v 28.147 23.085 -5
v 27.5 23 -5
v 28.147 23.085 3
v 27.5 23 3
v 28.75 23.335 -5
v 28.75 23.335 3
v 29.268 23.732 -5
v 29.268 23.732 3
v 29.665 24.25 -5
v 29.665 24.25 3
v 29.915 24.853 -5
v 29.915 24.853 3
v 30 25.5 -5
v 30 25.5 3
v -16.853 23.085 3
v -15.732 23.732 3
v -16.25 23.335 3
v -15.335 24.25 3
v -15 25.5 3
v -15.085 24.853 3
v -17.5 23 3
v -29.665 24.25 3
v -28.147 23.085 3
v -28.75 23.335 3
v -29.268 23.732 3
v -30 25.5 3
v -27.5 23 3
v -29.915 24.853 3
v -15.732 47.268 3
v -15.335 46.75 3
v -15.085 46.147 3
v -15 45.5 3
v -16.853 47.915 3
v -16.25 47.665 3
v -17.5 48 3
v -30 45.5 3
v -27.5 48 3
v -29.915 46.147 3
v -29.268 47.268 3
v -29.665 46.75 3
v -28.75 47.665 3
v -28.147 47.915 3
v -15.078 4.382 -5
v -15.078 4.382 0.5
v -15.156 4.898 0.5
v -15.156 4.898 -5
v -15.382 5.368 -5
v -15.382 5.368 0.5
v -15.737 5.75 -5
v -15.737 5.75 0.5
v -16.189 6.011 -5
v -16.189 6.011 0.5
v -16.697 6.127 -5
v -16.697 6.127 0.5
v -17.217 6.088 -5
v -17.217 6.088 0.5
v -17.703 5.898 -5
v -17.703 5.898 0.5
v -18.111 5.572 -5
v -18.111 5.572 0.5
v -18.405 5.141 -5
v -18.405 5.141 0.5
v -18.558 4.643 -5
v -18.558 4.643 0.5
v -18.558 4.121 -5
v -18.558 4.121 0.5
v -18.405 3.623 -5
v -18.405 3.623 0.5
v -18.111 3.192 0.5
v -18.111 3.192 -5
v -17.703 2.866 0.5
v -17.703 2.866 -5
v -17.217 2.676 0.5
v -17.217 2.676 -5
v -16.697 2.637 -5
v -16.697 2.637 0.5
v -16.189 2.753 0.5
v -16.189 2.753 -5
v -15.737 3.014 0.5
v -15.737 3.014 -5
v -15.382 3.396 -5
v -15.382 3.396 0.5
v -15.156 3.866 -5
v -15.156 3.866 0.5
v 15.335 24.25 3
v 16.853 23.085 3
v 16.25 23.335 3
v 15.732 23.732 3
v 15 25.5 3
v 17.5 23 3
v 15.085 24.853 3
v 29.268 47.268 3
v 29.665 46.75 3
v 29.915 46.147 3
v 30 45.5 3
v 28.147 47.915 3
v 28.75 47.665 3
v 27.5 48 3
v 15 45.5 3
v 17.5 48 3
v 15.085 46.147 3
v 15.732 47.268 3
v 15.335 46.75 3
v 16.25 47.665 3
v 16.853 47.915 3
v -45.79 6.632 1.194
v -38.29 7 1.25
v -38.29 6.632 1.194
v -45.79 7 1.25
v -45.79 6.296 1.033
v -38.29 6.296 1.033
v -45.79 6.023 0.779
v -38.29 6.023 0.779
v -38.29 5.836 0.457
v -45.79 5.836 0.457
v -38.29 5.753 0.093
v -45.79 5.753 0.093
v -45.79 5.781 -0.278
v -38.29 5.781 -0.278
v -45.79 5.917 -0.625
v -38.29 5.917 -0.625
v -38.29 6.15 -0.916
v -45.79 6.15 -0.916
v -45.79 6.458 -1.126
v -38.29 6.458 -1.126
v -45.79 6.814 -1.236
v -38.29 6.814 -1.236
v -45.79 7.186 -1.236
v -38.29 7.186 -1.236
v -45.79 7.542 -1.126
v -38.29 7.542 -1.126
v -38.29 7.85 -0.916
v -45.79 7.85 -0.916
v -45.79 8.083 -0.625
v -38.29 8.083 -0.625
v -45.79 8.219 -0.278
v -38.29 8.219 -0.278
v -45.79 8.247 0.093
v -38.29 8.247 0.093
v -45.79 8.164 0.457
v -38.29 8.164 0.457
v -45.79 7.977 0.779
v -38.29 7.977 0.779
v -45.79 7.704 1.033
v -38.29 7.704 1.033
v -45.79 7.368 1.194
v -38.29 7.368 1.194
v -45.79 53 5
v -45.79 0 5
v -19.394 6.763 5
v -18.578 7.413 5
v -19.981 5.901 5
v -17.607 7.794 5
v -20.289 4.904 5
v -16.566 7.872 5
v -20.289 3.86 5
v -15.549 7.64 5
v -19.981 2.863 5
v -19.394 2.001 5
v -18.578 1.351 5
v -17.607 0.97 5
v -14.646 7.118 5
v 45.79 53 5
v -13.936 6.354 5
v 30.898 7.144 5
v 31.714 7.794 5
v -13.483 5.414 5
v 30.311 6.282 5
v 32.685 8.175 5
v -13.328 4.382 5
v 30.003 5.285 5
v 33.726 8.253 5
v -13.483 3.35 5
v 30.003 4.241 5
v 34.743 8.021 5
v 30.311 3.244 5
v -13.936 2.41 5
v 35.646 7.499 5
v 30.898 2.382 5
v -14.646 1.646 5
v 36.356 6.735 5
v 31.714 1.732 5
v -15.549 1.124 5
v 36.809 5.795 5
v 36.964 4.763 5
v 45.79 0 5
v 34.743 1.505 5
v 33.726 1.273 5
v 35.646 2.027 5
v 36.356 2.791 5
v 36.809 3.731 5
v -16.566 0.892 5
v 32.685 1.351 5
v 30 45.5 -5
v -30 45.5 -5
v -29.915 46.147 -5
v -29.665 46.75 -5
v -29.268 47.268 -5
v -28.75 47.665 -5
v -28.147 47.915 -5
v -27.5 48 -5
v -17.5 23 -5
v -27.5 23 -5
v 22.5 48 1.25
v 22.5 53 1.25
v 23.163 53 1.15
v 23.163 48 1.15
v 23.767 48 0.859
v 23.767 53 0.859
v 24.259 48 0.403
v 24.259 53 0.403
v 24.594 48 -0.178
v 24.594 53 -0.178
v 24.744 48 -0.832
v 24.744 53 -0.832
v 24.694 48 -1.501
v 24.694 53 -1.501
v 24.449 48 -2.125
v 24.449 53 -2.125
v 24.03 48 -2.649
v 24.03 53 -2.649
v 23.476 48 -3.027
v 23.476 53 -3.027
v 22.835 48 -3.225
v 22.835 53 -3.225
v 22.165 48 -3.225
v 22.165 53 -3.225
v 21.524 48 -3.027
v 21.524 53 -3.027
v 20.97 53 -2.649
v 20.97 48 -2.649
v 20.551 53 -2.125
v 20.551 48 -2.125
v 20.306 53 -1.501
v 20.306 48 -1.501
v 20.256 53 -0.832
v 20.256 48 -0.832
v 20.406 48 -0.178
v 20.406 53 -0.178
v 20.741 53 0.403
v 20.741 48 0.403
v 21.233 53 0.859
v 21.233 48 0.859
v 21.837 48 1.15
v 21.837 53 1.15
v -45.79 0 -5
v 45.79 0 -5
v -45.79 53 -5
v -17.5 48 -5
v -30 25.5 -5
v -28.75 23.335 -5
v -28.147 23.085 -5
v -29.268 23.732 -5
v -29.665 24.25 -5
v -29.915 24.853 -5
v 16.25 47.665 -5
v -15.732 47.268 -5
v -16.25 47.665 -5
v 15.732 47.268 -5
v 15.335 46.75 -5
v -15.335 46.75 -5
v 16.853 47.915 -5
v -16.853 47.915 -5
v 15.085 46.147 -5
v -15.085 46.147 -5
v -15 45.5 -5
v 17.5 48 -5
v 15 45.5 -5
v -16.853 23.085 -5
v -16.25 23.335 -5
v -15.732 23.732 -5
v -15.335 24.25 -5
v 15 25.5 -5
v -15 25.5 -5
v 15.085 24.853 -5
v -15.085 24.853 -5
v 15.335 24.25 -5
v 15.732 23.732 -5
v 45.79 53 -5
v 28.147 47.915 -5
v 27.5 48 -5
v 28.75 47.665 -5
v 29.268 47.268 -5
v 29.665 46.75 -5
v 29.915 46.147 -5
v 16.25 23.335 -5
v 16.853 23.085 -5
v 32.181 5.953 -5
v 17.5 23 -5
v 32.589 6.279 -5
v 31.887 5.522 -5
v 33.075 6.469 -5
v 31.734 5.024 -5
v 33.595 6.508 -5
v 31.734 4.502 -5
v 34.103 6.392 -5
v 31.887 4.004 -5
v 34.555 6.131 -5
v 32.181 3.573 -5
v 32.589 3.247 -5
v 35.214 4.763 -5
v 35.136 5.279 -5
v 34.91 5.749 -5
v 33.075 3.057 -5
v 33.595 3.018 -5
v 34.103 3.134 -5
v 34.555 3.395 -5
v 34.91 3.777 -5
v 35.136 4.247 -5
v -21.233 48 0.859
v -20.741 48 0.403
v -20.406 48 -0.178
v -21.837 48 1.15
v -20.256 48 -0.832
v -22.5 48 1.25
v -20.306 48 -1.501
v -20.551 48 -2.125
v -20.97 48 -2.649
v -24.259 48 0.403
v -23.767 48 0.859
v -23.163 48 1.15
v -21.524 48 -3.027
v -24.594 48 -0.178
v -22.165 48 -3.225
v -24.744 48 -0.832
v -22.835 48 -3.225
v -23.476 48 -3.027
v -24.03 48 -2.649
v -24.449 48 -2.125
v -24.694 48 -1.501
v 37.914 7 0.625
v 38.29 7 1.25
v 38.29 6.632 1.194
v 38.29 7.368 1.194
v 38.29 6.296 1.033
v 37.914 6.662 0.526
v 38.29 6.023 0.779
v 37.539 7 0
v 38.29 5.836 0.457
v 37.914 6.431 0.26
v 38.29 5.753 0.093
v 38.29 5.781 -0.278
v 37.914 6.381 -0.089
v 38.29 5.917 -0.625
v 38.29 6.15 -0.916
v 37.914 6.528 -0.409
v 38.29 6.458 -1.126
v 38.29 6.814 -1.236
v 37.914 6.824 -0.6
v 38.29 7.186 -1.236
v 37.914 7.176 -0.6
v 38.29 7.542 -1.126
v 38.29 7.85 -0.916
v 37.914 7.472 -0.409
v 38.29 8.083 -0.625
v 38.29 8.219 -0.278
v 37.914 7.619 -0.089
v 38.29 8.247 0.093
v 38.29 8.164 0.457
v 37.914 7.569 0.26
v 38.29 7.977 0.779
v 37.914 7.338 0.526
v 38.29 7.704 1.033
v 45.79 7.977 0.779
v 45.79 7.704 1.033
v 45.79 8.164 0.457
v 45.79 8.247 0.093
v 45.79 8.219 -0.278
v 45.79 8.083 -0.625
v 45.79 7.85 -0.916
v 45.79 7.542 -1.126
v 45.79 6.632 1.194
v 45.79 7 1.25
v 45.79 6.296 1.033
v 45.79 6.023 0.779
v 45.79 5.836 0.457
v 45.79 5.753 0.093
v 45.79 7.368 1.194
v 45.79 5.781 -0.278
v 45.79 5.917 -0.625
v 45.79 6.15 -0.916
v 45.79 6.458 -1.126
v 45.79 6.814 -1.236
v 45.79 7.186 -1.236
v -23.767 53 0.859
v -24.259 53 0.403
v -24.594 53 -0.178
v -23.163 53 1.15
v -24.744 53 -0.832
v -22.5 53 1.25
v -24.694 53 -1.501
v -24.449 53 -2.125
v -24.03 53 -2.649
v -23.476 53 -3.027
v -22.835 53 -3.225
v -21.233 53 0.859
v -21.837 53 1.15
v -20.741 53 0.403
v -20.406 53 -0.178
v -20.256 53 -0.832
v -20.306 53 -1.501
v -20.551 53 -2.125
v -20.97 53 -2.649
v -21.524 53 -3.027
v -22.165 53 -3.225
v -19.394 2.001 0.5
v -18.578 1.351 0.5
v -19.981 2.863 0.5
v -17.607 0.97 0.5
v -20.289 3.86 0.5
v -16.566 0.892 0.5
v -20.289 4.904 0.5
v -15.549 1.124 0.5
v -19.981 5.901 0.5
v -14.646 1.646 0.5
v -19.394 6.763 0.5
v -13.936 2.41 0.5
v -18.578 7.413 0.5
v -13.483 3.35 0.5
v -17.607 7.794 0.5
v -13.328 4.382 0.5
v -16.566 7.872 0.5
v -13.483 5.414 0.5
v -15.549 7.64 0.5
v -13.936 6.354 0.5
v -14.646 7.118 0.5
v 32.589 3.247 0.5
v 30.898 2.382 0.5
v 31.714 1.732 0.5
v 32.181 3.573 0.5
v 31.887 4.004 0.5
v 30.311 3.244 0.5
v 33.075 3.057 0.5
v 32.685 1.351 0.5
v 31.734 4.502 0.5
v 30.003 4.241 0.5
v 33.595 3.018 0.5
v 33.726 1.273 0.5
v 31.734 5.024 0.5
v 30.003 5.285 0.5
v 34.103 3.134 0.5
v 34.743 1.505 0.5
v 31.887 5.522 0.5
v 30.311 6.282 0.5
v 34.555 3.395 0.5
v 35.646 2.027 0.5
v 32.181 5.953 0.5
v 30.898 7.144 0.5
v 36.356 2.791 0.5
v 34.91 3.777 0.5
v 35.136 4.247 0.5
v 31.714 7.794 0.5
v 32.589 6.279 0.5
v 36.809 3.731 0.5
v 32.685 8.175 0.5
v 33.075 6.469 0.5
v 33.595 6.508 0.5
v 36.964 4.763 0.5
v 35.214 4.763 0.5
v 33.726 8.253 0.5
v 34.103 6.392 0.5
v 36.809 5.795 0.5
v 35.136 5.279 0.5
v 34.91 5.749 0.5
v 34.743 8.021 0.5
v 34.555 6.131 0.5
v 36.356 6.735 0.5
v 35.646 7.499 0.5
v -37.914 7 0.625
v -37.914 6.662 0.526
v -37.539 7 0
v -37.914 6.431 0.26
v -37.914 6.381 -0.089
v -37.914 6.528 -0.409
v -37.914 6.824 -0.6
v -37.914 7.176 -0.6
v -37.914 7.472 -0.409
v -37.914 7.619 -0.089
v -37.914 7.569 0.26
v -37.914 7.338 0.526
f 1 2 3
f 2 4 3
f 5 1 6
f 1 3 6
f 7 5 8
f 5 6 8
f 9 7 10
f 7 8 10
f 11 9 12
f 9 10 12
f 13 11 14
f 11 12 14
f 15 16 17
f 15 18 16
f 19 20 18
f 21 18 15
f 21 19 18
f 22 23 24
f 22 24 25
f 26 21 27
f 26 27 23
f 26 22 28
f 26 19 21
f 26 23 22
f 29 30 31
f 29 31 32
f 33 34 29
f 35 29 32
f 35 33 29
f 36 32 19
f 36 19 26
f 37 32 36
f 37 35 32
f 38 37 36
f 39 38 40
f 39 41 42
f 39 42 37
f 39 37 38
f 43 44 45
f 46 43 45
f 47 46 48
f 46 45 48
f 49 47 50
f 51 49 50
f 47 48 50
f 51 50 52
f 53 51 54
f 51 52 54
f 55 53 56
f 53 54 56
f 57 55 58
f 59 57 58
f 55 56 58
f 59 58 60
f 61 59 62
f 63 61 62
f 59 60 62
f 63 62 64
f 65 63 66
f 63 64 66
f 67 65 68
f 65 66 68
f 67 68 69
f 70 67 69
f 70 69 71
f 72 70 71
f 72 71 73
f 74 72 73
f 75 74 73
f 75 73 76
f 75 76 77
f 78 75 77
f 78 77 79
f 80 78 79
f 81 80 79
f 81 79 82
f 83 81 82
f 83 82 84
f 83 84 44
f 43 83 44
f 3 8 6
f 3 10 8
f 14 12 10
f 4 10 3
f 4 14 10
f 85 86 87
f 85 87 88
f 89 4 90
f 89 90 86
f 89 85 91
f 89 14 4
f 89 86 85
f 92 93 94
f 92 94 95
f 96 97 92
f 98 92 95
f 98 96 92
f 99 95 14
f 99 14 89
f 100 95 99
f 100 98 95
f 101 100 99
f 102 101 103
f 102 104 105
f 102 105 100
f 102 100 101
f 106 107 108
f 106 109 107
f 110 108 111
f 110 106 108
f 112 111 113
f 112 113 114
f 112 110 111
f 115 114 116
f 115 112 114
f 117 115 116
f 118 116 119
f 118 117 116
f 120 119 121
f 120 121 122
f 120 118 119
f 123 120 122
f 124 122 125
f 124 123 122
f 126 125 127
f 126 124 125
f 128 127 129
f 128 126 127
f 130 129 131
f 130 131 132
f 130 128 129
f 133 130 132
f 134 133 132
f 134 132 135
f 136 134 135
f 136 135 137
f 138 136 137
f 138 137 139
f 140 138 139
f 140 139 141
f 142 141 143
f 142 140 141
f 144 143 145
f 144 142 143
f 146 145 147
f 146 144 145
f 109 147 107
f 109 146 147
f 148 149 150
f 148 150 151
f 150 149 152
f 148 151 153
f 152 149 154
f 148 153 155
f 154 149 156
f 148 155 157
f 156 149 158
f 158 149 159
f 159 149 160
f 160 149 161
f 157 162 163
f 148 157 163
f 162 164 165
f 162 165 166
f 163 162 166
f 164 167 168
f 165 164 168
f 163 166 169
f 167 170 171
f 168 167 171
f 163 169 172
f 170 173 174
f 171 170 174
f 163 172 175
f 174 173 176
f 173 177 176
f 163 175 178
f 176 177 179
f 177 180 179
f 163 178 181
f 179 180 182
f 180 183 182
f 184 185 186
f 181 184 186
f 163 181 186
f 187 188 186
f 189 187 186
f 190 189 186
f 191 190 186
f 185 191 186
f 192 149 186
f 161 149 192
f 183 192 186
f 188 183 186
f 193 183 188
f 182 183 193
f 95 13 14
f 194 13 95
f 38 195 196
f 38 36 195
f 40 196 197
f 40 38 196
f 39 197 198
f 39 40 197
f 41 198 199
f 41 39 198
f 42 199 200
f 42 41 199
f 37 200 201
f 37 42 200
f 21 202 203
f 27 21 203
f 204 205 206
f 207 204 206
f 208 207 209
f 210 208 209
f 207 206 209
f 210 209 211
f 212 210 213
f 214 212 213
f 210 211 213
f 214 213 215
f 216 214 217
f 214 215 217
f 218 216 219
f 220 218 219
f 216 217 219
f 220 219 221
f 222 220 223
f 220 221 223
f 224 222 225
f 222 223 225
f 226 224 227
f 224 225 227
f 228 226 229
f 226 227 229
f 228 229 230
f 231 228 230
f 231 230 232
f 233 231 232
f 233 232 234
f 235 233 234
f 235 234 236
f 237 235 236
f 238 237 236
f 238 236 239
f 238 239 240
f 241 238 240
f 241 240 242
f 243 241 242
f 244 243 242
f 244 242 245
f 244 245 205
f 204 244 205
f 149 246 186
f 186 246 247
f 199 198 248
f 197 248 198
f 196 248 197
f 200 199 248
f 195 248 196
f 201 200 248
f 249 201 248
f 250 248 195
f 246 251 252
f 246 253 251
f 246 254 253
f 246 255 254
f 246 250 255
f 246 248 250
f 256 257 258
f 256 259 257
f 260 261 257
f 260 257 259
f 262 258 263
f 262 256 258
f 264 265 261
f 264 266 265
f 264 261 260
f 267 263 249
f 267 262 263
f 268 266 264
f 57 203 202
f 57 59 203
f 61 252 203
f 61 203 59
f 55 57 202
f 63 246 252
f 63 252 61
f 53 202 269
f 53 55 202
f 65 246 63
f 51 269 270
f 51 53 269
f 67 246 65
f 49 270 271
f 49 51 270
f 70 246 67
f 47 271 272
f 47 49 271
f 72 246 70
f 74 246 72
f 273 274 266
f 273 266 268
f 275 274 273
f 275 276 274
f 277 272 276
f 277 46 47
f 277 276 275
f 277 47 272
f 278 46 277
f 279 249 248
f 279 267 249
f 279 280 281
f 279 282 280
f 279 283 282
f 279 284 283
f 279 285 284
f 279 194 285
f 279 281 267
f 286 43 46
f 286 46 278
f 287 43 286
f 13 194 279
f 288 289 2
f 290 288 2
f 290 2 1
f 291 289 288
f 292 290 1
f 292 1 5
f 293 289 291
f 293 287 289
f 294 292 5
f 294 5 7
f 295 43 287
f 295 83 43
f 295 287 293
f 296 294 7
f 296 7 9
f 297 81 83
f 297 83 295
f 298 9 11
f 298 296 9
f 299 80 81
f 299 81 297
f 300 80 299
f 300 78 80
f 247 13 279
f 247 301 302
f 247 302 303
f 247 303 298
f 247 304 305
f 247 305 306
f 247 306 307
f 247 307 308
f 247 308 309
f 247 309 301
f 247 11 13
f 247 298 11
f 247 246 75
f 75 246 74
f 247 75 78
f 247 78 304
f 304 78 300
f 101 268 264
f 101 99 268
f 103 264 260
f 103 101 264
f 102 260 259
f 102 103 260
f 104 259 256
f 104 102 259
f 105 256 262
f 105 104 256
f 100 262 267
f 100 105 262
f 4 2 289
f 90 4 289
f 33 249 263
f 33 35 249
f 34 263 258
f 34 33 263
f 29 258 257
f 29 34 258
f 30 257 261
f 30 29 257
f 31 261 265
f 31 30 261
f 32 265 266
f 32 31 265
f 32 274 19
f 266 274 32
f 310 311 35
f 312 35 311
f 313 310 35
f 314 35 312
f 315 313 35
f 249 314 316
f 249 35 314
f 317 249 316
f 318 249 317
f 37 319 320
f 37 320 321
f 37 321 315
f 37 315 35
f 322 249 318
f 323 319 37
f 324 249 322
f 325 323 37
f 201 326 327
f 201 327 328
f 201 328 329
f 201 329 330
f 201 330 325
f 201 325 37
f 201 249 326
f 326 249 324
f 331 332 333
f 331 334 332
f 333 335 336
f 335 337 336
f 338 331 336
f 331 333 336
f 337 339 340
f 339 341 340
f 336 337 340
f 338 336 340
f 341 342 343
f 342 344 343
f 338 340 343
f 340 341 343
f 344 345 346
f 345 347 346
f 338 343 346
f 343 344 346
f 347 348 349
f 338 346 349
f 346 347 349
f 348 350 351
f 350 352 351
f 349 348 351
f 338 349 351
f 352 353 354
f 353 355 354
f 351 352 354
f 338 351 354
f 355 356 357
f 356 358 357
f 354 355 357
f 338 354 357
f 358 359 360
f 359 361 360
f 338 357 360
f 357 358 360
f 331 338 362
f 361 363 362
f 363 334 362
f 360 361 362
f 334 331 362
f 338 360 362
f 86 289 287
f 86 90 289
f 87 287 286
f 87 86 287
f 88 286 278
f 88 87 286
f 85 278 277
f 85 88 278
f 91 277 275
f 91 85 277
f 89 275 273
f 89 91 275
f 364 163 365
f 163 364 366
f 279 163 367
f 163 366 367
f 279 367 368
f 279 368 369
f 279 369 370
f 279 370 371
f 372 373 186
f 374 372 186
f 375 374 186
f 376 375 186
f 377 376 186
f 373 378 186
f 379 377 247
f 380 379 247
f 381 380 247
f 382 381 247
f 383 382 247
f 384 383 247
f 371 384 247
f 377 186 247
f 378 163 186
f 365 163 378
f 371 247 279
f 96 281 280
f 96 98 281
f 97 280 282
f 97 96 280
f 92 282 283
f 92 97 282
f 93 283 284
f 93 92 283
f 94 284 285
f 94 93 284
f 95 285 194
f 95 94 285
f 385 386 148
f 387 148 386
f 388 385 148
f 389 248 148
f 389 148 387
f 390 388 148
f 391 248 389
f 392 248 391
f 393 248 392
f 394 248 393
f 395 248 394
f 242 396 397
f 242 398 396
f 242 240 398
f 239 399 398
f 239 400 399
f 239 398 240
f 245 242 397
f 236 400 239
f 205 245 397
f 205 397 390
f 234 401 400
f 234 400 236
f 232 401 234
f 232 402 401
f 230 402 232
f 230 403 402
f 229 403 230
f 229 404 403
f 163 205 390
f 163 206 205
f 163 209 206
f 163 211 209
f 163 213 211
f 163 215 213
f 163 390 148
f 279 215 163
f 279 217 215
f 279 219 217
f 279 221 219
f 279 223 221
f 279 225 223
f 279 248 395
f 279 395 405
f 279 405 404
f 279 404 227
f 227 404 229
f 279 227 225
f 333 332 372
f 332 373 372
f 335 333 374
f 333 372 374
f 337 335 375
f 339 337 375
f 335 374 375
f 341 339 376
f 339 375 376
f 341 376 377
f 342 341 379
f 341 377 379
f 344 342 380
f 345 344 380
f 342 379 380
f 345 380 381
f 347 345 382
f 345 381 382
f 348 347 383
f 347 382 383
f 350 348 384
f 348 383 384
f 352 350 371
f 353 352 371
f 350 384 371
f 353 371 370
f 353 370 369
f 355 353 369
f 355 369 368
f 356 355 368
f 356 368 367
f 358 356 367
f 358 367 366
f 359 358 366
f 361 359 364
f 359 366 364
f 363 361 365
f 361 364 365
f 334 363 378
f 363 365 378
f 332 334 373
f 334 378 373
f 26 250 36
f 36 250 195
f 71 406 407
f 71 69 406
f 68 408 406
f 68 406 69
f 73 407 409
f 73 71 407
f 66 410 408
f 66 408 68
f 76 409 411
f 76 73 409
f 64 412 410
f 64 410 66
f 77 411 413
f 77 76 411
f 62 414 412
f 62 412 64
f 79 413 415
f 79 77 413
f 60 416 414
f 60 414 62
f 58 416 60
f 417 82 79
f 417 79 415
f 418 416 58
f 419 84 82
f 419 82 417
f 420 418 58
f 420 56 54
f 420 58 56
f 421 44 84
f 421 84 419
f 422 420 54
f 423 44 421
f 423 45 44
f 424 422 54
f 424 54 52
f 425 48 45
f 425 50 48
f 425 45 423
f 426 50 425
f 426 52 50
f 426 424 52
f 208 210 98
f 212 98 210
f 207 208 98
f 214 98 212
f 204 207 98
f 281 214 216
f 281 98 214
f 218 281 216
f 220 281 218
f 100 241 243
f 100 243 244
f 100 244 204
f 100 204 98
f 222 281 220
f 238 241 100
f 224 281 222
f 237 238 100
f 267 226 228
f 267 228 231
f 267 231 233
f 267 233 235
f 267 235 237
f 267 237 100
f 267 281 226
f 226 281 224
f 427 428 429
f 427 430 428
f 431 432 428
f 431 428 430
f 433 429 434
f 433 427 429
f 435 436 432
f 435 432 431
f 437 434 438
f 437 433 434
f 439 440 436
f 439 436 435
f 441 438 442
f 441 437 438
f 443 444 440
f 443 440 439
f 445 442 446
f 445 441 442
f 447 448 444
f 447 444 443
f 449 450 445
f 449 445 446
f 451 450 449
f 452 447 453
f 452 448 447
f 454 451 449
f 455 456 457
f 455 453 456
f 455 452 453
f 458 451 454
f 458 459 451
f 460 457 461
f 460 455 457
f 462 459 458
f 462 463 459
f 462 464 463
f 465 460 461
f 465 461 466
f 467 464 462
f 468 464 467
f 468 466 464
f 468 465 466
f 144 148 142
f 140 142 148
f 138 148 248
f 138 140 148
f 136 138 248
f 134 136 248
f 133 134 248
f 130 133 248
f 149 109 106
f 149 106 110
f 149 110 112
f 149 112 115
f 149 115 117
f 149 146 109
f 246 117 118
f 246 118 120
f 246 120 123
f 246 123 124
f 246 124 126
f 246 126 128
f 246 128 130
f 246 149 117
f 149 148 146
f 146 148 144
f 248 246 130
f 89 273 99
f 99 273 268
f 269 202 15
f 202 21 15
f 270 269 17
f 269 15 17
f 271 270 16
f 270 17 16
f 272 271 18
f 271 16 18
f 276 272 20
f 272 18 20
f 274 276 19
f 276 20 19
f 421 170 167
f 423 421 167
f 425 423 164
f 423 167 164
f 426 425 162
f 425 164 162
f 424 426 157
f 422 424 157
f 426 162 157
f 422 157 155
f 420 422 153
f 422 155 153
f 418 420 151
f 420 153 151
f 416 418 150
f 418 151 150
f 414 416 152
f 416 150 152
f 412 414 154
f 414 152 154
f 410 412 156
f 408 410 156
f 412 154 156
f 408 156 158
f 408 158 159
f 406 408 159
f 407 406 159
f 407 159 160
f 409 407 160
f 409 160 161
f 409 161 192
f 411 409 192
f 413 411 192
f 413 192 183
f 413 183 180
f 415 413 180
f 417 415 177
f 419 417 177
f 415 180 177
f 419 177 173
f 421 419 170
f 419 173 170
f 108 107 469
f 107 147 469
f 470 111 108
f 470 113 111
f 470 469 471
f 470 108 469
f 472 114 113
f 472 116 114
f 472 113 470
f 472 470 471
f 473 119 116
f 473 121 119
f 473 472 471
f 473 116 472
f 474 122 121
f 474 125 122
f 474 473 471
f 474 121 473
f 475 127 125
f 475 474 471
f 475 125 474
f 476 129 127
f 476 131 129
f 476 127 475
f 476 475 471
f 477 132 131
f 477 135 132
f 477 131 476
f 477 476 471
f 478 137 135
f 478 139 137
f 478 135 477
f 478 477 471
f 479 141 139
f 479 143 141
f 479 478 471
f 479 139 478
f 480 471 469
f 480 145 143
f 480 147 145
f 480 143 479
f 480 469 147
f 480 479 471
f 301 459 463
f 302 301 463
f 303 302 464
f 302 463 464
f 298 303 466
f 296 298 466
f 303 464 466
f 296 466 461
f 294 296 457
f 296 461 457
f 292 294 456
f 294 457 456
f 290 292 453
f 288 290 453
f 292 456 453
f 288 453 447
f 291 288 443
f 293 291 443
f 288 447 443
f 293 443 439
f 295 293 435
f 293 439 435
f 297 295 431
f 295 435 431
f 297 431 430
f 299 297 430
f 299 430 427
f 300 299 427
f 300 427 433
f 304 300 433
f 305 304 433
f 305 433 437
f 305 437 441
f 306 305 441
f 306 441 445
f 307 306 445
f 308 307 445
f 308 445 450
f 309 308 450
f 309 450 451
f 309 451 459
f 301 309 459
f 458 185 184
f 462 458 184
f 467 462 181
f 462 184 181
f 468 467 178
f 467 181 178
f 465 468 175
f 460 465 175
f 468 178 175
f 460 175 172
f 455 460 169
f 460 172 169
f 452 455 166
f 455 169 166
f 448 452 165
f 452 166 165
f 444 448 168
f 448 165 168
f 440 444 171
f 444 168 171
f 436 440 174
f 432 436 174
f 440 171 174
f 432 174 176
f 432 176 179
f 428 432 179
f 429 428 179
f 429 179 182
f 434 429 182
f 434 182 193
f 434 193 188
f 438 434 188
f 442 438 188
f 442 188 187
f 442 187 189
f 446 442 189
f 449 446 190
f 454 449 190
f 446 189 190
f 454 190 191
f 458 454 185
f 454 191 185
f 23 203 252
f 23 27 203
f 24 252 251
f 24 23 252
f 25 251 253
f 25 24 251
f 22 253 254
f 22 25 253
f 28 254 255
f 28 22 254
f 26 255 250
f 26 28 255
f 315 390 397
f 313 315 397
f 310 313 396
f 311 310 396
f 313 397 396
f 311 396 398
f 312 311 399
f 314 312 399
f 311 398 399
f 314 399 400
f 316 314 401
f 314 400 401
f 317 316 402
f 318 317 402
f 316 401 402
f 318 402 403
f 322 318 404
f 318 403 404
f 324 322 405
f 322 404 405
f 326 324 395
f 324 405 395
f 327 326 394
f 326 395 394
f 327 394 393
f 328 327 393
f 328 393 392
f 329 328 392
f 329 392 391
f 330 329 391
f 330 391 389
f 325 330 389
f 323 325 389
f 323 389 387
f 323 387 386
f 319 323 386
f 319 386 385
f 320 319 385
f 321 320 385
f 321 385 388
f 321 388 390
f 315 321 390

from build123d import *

# Parameters (mm, degrees)
SKETCH1_W           = 91.58
SKETCH1_H           = 10
BOSS_EXTRUDE1_DEPTH = 53
SKETCH2_R           = 1.75
CUT_EXTRUDE1_DEPTH  = 71.75114204
SKETCH4_W           = 15
SKETCH4_H           = 25
CUT_EXTRUDE3_DEPTH  = 8
SKETCH5_R           = 2.25
CUT_EXTRUDE4_DEPTH  = 17
SKETCH7_R           = 3.5
CUT_EXTRUDE5_DEPTH  = 4.5
FILLET1_R           = 2.5


with BuildPart() as part:
    # Sketch1 → Boss-Extrude1 (new body)
    with BuildSketch(Plane(origin=(0, 0, 0), x_dir=(1, 0, 0), z_dir=(0, 1, 0))):
        Rectangle(SKETCH1_W, SKETCH1_H)
    extrude(amount=BOSS_EXTRUDE1_DEPTH)

    # Sketch2 → Cut-Extrude1 (cut, through all)
    with BuildSketch(Plane.XY.offset(5)):
        with Locations((33.464, 4.763)):
            Circle(SKETCH2_R)
        with Locations((-16.828, 4.382)):
            Circle(SKETCH2_R)
    extrude(amount=-CUT_EXTRUDE1_DEPTH, mode=Mode.SUBTRACT)

    # Sketch4 → Cut-Extrude3 (cut)
    with BuildSketch(Plane(origin=(0, 0, -5), x_dir=(-1, 0, 0), z_dir=(0, 0, -1))):
        with Locations((22.5, 35.5)):
            Rectangle(SKETCH4_W, SKETCH4_H)
        with Locations((-22.5, 35.5)):
            Rectangle(SKETCH4_W, SKETCH4_H)
    extrude(amount=-CUT_EXTRUDE3_DEPTH, mode=Mode.SUBTRACT)

    # Sketch5 → Cut-Extrude4 (cut)
    with BuildSketch(Plane(origin=(0, 53, 0), x_dir=(1, 0, 0), z_dir=(0, 1, 0))):
        with Locations(Location((22.5, 1, 0), (0, 0, 270))):
            Circle(SKETCH5_R)
        with Locations(Location((-22.5, 1, 0), (0, 0, 270))):
            Circle(SKETCH5_R)
    extrude(amount=-CUT_EXTRUDE4_DEPTH, mode=Mode.SUBTRACT)

    # Sketch7 → Cut-Extrude5 (cut)
    with BuildSketch(Plane.XY.offset(5)):
        with Locations((33.464, 4.763)):
            Circle(SKETCH7_R)
        with Locations((-16.828, 4.382)):
            Circle(SKETCH7_R)
    extrude(amount=-CUT_EXTRUDE5_DEPTH, mode=Mode.SUBTRACT)

    # Sketch9 → M3 Tapped Hole1 (revolve, cut)
    with BuildSketch(Plane(origin=(-45.79, 7, 0), x_dir=(0, 0, 1), z_dir=(0, 1, 0))):
        Polygon((0, 0), (0, 8.251075774), (1.25, 7.5), (1.25, 0), align=None)
    m3_tapped_hole1 = revolve(axis=Axis((-52.14, 7, 0), (1, 0, 0)), mode=Mode.SUBTRACT)

    # Mirror1: M3 Tapped Hole1 across plane
    add(m3_tapped_hole1.mirror(Plane(origin=(0, 0, 0), x_dir=(0, 0, 1), z_dir=(1, 0, 0))), mode=Mode.SUBTRACT)

    # Fillet1
    fillet1_edges = [part.edges().sort_by_distance(p)[0] for p in [
        (-30, 48, -1),
        (-30, 23, -1),
        (-15, 23, -1),
        (-15, 48, -1),
        (15, 48, -1),
        (15, 23, -1),
        (30, 23, -1),
        (30, 48, -1),
    ]]
    fillet(fillet1_edges, radius=FILLET1_R)


solid = part.part
